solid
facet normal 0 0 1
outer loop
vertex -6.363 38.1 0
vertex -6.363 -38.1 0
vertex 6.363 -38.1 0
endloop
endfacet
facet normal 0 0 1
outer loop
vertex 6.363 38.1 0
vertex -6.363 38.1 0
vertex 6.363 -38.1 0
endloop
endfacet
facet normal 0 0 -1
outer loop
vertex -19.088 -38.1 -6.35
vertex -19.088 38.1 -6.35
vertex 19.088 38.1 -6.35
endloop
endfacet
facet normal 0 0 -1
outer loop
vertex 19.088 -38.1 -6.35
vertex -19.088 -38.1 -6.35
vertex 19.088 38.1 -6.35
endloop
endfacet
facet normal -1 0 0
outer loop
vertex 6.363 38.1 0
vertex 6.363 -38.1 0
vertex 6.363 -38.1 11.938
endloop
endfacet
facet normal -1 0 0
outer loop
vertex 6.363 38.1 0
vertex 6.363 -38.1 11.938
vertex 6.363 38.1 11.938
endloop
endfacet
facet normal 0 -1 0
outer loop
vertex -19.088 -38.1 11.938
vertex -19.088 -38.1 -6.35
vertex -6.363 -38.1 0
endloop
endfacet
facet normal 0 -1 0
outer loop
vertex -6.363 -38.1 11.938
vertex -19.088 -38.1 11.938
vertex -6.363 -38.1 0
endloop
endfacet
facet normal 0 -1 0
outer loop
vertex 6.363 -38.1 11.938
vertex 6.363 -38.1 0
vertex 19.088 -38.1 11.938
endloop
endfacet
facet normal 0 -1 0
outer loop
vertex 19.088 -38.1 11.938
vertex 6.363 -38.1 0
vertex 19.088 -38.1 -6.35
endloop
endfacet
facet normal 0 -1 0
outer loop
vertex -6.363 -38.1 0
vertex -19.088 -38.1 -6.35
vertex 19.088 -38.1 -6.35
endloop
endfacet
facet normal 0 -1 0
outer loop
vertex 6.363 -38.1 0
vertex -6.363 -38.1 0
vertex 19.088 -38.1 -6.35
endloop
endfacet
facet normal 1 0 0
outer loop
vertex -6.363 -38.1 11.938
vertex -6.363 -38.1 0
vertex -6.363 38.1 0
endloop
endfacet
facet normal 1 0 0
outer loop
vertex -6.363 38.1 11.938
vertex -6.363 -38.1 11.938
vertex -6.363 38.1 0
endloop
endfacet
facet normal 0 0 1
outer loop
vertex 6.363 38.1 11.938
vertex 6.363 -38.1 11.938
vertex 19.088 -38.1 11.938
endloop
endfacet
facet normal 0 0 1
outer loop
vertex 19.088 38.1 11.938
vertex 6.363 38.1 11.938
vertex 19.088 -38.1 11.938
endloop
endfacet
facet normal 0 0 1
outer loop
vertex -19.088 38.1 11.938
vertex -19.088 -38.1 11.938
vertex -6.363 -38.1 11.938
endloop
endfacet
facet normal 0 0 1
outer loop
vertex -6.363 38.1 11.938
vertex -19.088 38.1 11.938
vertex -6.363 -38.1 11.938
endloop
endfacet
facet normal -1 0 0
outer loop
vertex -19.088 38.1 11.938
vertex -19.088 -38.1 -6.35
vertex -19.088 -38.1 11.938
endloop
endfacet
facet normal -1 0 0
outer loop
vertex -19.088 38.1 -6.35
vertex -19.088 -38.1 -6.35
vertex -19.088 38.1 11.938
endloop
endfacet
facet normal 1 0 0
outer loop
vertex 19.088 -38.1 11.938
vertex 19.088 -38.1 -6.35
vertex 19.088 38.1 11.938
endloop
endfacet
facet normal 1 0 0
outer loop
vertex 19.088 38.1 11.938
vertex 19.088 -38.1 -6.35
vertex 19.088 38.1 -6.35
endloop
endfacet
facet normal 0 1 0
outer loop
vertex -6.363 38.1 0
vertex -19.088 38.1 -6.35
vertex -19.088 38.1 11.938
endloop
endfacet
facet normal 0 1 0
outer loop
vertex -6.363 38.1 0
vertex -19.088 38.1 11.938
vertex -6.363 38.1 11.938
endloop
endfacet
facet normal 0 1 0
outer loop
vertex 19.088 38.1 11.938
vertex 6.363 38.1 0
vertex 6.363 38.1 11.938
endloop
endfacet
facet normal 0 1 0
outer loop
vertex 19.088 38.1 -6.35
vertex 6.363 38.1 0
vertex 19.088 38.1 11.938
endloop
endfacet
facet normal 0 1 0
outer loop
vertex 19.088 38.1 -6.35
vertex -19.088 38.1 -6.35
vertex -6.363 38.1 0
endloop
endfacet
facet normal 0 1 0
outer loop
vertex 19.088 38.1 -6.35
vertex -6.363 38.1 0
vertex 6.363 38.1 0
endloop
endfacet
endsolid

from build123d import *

# Parameters (mm, degrees)
F0_W     = 38.1762
F0_H     = 76.2
F1_DEPTH = 6.35
F2_W     = 12.7254
F2_H     = 76.2
F3_DEPTH = 11.938
F4_DEPTH = 11.938


with BuildPart() as f1:
    # F0 (on Top) → F1 (new body)
    with BuildSketch(Plane.XY):
        Rectangle(F0_W, F0_H)
    extrude(amount=-F1_DEPTH)

    # F2 (on face) → F3 (join)
    with BuildSketch(Plane.XY):
        with Locations((-12.7254, 0)):
            Rectangle(F2_W, F2_H)
    extrude(amount=F3_DEPTH)

    # F2 (on face) → F4 (join)
    with BuildSketch(Plane.XY):
        with Locations((12.7254, 0)):
            Rectangle(F2_W, F2_H)
    extrude(amount=F4_DEPTH)


solid = f1.part
